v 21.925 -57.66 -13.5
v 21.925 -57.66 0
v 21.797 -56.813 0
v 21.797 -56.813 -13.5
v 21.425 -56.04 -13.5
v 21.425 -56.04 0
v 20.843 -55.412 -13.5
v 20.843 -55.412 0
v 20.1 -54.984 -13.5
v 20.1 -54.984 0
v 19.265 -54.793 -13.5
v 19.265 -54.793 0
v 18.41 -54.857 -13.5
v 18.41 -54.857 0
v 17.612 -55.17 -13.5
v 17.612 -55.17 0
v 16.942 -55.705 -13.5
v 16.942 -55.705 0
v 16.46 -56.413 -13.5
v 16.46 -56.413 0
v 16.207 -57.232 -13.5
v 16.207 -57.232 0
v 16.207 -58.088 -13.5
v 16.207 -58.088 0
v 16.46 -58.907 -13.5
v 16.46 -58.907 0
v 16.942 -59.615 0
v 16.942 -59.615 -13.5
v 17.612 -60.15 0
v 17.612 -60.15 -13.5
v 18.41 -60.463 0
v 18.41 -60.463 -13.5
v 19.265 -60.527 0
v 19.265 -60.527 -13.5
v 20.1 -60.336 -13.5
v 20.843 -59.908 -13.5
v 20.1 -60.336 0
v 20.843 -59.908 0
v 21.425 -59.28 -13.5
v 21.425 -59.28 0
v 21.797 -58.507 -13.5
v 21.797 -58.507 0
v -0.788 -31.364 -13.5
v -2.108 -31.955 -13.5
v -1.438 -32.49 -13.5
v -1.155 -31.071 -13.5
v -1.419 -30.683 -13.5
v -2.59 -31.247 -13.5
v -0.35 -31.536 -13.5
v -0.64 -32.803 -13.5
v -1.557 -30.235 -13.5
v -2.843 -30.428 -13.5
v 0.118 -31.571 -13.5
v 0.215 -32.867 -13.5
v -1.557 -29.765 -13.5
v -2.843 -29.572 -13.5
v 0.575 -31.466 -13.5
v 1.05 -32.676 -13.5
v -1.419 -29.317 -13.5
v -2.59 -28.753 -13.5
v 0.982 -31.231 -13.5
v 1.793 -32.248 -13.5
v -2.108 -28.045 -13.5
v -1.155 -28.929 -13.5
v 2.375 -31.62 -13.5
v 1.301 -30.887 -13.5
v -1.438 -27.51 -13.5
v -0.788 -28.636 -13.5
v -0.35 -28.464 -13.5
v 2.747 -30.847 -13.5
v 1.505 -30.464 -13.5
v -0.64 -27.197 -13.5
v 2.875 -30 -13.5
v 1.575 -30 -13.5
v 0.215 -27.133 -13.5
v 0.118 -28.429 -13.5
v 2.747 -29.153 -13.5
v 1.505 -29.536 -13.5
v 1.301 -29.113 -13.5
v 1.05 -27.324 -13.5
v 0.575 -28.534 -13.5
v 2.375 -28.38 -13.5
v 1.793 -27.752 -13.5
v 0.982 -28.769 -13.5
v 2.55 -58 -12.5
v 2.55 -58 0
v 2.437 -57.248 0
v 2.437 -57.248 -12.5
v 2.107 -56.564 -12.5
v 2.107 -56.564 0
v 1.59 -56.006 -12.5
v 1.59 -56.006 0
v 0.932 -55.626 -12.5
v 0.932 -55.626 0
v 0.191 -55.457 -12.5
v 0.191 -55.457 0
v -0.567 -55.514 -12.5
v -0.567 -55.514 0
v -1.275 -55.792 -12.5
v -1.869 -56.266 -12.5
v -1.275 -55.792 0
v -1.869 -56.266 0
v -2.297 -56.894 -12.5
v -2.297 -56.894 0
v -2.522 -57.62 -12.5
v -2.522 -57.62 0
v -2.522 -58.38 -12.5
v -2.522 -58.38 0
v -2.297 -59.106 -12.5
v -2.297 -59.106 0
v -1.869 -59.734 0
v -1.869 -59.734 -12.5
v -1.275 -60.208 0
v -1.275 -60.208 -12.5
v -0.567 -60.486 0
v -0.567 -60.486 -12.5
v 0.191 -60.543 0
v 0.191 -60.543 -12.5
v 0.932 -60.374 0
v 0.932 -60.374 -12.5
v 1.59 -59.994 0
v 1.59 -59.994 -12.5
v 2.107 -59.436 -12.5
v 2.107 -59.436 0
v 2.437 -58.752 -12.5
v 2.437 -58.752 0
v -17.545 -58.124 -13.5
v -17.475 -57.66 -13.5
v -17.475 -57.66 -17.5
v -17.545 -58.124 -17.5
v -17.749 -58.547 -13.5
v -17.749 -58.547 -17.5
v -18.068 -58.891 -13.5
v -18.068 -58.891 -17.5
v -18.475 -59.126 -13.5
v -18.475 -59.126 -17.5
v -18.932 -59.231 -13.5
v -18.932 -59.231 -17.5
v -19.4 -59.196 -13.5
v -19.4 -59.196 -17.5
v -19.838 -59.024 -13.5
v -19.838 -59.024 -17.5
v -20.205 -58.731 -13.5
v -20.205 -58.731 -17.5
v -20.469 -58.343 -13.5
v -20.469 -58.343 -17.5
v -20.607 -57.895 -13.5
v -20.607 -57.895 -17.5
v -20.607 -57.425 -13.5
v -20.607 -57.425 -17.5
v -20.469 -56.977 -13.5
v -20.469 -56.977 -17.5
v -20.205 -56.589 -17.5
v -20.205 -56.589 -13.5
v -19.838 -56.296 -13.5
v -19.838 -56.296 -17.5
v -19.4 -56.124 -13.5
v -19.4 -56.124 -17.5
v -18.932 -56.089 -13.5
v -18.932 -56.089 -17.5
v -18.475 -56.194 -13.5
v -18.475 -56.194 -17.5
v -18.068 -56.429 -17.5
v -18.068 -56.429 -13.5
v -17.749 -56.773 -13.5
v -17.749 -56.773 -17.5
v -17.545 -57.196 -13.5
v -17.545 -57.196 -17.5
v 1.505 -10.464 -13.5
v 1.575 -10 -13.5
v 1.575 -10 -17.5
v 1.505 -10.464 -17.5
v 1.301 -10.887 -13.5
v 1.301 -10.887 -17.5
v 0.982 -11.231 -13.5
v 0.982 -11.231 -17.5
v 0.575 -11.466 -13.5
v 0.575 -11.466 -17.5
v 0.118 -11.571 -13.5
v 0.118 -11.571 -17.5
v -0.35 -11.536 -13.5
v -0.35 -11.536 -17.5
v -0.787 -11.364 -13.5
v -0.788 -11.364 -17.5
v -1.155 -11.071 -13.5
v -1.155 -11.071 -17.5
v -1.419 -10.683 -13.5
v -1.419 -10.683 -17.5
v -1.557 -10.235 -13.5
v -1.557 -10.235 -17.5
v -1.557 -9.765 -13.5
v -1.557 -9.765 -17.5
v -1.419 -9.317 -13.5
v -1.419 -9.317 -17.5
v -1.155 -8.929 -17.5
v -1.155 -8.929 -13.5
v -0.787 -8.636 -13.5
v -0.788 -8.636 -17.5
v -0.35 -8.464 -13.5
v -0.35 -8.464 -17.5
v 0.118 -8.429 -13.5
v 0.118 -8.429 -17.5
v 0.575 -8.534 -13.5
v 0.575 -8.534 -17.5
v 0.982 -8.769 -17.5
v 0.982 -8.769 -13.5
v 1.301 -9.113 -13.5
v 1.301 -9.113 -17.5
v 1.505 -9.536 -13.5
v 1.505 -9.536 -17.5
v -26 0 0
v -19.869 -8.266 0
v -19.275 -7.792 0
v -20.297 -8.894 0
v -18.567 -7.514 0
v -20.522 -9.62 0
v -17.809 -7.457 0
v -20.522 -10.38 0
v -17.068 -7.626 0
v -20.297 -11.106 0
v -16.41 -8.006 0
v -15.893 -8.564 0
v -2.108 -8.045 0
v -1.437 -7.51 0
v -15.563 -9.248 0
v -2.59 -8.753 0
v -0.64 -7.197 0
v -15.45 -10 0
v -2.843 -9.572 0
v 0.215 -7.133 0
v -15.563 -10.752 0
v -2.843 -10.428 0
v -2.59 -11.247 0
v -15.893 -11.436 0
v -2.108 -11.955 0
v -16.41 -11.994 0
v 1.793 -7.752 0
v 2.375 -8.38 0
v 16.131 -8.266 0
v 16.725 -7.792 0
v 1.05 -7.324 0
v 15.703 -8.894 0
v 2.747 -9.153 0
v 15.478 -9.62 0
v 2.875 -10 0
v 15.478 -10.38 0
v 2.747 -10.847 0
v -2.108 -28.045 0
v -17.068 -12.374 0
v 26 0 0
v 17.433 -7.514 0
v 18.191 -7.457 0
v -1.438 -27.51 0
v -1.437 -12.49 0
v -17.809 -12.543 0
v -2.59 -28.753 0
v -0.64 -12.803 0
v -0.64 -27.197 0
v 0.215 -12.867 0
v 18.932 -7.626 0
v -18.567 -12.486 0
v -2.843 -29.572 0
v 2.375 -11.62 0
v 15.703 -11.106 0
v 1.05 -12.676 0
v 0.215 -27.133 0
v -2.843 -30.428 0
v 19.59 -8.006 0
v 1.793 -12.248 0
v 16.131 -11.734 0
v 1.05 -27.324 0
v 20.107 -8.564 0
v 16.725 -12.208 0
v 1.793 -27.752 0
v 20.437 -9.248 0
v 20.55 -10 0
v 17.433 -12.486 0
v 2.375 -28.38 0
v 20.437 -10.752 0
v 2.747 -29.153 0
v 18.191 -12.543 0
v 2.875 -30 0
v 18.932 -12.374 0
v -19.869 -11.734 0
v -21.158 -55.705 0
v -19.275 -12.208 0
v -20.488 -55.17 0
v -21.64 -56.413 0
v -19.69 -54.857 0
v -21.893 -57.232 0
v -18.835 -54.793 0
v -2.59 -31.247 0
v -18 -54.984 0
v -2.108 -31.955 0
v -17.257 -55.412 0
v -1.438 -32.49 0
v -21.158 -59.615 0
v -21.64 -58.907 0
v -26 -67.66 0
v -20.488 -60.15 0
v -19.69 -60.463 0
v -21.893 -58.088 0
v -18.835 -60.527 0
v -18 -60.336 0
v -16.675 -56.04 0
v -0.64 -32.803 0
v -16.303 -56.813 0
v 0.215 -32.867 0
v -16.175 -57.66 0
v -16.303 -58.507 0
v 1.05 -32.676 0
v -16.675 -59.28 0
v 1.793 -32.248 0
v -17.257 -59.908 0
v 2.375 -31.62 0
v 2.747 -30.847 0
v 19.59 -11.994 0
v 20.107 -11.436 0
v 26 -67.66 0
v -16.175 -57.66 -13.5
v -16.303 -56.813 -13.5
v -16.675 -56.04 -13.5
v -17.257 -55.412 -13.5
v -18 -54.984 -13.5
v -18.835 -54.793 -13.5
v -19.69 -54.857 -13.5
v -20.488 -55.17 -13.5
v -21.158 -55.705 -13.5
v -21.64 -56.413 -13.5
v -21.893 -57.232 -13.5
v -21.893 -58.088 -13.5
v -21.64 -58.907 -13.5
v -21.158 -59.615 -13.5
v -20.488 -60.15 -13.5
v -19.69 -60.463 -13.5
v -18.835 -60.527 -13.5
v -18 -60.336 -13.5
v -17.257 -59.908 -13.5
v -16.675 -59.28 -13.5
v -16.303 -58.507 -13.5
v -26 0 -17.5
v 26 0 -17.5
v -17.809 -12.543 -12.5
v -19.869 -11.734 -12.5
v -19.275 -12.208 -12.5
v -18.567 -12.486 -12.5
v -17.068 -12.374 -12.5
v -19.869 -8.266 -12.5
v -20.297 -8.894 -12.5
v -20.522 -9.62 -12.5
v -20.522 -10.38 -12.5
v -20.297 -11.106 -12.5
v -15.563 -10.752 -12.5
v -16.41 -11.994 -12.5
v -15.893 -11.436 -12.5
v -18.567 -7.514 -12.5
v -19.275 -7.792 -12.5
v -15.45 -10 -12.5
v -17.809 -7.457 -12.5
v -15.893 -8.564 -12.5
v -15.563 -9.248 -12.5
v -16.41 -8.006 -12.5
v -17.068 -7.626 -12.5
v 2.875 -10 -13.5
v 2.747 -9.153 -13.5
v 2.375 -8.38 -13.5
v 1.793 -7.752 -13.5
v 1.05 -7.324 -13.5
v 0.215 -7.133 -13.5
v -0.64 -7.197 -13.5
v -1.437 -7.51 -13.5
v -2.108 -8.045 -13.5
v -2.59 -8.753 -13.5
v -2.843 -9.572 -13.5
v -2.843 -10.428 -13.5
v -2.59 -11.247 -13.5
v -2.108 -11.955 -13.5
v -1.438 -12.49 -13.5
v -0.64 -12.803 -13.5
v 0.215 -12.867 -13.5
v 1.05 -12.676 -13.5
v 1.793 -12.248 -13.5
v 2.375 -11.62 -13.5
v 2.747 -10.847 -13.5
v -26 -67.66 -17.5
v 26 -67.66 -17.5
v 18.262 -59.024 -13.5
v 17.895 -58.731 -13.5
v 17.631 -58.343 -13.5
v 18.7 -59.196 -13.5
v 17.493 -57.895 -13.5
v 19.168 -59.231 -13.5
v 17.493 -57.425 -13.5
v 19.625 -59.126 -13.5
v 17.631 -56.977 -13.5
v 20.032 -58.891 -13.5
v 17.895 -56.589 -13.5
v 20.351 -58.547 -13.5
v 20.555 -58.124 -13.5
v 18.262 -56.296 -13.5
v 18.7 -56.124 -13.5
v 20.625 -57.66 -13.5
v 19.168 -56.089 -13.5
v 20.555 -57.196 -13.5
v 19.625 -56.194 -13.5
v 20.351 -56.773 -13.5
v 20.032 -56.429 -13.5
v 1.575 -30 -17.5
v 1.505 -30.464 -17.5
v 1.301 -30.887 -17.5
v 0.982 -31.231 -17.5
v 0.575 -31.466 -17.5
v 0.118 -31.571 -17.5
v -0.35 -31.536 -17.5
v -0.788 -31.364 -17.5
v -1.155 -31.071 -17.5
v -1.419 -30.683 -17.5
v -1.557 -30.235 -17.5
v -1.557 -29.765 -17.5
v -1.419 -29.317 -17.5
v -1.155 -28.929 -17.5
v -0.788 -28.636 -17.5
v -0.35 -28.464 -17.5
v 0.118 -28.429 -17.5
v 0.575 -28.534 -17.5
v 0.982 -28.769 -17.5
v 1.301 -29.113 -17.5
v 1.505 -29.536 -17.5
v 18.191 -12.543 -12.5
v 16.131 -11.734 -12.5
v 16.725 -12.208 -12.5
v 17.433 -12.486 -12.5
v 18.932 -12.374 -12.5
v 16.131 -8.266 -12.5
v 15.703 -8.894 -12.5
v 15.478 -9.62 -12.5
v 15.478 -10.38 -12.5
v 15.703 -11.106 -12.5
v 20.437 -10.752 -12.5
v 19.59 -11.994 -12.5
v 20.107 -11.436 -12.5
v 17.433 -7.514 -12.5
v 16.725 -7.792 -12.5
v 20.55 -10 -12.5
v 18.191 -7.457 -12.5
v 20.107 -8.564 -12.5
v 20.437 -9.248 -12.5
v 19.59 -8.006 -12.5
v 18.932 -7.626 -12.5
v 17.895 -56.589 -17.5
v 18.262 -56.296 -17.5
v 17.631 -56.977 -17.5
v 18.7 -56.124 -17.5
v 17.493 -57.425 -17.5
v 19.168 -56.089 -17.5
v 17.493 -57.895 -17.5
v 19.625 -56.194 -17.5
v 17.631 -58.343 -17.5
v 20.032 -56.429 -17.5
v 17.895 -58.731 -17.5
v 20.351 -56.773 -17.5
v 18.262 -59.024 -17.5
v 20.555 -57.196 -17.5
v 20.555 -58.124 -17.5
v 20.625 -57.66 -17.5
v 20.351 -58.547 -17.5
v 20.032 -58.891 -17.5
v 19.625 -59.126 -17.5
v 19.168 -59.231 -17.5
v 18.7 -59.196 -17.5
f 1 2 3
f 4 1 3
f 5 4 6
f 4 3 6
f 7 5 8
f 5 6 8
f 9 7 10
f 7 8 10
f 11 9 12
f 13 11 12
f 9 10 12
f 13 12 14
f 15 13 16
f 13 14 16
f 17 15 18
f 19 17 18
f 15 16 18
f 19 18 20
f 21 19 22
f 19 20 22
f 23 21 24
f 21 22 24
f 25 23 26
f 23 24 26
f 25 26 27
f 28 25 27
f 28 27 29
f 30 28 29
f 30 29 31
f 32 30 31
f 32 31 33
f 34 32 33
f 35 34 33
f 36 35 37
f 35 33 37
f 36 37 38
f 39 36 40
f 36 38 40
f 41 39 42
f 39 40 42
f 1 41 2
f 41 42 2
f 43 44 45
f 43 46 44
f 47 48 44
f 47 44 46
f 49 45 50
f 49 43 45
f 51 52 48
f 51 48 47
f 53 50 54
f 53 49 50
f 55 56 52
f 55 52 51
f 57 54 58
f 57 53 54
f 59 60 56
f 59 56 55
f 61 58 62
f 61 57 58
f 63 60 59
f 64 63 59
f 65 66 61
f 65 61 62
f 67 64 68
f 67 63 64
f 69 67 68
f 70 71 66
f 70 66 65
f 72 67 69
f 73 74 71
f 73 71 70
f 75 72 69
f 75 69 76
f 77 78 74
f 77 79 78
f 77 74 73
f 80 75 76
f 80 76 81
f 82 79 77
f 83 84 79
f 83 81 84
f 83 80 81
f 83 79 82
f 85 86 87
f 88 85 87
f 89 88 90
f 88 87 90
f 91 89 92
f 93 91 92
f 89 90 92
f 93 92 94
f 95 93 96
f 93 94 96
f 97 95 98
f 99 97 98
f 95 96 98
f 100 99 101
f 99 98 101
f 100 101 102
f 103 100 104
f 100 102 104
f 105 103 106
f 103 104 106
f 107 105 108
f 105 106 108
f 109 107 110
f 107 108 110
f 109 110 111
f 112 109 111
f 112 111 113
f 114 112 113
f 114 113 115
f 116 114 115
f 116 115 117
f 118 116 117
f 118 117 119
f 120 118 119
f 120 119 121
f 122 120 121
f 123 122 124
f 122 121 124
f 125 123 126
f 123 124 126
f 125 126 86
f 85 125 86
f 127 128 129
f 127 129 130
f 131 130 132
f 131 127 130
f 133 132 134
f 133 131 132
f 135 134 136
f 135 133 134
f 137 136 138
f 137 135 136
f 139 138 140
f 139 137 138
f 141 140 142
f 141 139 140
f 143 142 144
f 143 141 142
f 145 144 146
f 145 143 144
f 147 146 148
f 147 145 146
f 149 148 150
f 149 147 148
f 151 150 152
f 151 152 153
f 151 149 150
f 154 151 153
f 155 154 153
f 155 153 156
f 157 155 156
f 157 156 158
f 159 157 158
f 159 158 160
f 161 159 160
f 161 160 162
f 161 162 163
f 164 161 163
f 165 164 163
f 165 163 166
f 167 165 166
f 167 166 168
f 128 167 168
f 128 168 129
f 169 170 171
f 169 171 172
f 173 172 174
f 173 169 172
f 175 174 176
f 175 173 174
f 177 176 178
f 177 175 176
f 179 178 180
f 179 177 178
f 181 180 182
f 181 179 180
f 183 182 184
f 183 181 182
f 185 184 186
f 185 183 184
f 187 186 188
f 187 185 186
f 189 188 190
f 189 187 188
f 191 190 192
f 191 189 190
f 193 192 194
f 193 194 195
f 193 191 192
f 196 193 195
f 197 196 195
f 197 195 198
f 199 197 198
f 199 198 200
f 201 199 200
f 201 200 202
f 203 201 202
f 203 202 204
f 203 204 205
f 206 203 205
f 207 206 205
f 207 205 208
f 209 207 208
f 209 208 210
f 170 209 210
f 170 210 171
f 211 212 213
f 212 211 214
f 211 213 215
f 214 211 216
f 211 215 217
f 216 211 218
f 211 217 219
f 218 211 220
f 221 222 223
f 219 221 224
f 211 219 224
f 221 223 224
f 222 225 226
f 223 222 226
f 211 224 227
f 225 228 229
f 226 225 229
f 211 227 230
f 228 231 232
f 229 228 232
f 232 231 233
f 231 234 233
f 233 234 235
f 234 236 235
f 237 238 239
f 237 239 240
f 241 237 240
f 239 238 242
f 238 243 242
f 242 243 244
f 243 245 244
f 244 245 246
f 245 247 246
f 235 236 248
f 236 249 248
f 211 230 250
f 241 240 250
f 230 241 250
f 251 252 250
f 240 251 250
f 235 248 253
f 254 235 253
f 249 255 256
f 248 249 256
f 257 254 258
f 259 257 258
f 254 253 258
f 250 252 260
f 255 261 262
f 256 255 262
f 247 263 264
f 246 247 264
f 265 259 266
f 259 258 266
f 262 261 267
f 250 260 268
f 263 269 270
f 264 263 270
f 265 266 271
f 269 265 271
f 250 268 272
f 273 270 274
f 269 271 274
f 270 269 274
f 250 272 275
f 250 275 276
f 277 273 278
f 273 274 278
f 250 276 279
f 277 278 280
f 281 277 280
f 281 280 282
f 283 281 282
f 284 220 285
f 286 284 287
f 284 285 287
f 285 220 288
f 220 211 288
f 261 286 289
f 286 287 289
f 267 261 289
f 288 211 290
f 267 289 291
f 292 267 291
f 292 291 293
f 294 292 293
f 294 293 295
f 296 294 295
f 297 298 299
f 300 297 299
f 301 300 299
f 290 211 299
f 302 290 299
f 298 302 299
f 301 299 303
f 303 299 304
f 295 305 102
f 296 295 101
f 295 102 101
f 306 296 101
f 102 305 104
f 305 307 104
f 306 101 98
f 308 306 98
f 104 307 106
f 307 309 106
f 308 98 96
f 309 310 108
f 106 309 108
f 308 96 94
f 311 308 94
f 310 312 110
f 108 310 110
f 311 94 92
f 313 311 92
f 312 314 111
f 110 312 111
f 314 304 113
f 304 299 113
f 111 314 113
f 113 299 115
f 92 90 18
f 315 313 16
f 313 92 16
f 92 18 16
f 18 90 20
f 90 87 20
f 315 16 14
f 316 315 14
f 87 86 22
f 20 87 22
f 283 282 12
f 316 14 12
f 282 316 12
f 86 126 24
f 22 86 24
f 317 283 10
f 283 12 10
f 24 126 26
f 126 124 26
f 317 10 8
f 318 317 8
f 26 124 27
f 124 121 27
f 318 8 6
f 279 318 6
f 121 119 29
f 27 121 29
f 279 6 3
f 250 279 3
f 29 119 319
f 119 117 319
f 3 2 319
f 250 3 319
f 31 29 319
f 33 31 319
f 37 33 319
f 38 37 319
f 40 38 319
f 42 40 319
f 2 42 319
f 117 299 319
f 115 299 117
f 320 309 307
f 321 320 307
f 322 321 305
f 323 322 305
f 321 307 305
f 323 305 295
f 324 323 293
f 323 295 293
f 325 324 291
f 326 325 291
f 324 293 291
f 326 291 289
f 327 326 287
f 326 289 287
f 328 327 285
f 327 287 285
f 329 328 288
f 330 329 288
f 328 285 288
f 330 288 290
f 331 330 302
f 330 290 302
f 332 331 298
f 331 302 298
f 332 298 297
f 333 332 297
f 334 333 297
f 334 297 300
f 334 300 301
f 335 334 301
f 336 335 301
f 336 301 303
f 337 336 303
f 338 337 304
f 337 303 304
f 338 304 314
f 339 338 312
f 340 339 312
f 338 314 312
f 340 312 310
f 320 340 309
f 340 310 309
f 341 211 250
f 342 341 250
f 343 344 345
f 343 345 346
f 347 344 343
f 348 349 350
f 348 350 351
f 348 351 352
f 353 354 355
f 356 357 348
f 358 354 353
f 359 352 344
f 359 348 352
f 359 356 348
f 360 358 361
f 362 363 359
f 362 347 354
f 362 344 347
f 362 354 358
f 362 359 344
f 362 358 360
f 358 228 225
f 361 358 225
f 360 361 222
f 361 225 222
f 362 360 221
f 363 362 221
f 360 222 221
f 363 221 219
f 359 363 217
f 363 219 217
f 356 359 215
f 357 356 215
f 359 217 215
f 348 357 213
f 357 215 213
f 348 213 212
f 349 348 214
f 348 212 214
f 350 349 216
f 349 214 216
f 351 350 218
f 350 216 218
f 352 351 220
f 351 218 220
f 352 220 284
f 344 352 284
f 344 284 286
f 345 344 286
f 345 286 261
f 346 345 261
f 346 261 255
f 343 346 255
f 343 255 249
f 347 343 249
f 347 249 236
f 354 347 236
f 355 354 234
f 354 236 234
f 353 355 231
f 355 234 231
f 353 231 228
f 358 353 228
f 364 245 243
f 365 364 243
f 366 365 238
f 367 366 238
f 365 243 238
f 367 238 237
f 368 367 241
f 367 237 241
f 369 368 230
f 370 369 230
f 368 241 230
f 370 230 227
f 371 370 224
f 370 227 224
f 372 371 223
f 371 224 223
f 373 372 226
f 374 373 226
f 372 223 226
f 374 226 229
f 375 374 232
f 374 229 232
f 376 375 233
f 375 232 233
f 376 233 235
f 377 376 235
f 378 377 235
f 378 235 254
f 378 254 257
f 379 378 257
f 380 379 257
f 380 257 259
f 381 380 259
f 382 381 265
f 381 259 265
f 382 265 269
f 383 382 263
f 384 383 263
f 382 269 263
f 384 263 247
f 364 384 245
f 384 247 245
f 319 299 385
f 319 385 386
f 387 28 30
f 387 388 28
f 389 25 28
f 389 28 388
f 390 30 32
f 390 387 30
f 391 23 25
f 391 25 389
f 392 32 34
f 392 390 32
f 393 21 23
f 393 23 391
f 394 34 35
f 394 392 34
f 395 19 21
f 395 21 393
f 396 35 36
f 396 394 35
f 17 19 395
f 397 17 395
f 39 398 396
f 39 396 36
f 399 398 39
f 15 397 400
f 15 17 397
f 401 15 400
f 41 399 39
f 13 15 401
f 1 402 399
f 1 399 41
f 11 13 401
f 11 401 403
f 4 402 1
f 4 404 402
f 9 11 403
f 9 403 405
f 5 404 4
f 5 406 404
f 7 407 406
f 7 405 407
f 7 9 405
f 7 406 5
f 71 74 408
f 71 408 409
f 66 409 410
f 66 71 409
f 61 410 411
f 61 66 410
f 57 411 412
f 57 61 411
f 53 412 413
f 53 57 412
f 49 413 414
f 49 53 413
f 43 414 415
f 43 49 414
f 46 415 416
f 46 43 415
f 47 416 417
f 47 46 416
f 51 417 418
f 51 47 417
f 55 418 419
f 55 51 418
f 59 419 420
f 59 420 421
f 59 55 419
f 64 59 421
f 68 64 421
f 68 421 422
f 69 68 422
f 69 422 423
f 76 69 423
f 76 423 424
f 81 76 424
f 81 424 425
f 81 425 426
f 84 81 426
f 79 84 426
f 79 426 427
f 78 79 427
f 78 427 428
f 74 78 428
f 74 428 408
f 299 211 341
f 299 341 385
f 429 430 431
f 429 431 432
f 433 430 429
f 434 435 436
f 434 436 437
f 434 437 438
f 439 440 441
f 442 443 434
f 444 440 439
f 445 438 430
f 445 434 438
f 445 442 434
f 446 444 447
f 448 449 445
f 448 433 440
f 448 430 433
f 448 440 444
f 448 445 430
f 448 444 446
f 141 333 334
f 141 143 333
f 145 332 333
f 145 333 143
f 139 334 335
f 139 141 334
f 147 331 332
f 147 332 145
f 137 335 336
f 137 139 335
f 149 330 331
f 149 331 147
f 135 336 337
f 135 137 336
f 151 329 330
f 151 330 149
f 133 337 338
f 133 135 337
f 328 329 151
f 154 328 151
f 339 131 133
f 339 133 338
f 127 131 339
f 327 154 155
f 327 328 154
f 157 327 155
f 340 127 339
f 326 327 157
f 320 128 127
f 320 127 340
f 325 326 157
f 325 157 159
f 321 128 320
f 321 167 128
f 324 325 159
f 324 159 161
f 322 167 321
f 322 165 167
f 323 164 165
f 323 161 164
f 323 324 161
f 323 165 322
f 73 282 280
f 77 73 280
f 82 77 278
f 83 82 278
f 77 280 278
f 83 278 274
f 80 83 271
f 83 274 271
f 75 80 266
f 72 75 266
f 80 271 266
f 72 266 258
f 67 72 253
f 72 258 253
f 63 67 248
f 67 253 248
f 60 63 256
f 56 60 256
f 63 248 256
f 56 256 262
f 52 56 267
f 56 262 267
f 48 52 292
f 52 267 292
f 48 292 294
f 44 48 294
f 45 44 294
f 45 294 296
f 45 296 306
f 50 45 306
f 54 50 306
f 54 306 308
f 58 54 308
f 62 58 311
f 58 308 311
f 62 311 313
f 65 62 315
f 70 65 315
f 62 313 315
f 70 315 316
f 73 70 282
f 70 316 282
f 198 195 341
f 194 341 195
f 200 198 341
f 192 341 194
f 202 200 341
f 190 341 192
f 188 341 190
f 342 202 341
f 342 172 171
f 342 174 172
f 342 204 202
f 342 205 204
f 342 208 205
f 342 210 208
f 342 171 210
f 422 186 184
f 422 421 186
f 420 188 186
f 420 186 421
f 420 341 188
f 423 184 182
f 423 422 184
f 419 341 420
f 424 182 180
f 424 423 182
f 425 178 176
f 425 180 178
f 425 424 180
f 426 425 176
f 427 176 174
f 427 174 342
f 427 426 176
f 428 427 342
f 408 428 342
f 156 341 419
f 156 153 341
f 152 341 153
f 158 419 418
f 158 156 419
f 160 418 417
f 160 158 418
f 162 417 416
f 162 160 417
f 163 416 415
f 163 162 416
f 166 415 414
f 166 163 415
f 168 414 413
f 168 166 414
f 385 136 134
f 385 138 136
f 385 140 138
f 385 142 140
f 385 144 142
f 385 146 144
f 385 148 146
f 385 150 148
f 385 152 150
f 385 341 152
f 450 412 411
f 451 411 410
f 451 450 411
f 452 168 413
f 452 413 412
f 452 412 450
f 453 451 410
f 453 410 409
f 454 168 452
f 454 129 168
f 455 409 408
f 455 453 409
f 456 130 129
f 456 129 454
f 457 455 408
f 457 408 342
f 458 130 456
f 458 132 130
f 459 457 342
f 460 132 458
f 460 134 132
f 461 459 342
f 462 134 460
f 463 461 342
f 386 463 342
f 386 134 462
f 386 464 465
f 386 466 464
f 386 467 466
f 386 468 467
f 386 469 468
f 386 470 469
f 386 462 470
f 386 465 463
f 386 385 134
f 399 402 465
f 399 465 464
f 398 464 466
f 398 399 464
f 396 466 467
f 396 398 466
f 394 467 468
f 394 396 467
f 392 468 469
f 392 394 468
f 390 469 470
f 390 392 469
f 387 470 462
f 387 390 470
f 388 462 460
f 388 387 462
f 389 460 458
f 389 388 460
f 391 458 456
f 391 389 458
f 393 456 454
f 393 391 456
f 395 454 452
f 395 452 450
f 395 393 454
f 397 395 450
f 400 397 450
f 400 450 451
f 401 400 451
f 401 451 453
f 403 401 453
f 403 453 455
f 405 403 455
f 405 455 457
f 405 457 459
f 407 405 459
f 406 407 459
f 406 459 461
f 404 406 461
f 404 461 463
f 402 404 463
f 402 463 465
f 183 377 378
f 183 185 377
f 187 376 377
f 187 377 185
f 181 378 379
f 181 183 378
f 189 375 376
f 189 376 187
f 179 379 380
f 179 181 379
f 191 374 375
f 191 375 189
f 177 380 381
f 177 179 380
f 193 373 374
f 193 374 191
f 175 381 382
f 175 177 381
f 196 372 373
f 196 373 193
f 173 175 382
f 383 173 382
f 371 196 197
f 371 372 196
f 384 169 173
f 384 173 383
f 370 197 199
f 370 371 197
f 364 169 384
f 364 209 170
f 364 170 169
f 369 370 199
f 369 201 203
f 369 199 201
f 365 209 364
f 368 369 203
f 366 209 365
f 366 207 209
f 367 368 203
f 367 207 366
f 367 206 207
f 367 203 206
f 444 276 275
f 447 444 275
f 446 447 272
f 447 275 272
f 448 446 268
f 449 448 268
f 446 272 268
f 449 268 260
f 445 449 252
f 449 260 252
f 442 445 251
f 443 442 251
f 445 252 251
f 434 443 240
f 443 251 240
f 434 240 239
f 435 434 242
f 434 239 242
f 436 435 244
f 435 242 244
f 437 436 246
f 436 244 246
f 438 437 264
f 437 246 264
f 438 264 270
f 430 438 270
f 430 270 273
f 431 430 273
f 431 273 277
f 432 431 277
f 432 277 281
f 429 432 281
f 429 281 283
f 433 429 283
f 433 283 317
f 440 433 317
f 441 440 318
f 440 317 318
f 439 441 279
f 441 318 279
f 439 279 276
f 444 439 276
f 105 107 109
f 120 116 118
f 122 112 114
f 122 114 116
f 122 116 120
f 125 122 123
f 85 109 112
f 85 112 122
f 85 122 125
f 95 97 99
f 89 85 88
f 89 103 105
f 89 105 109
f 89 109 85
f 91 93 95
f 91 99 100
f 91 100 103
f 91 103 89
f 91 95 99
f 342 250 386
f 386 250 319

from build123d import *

# Parameters (mm, degrees)
F1_W     = 52
F1_H     = 67.66
F2_DEPTH = 17.5
F0_R     = 1.575
F3_DEPTH = 17.5
F4_R     = 2.875
F5_DEPTH = 13.5
F6_R     = 2.55
F7_DEPTH = 12.5
F8_ANGLE = 180
F9_ANGLE = 180


with BuildPart() as f2:
    # F1 (on Top) → F2 (new body)
    with BuildSketch(Plane.XY):
        with Locations((0, 3.83)):
            Rectangle(F1_W, F1_H)
    extrude(amount=F2_DEPTH)

    # F0 (on Top) → F3 (cut)
    with BuildSketch(Plane.XY):
        Circle(F0_R)
        with Locations((0, -20)):
            Circle(F0_R)
        with Locations((-19.05, 27.66)):
            Circle(F0_R)
        with Locations((19.05, 27.66)):
            Circle(F0_R)
    extrude(amount=F3_DEPTH, mode=Mode.SUBTRACT)

    # F4 (on face) → F5 (cut)
    with BuildSketch(Plane(origin=(0, 0, 0), x_dir=(1, 0, 0), z_dir=(0, 0, -1))):
        Circle(F4_R)
        with Locations((19.05, -27.66)):
            Circle(F4_R)
        with Locations((-19.05, -27.66)):
            Circle(F4_R)
        with Locations((0, 20)):
            Circle(F4_R)
    extrude(amount=-F5_DEPTH, mode=Mode.SUBTRACT)

    # F6 (on face) → F7 (cut)
    with BuildSketch(Plane(origin=(0, 0, 0), x_dir=(1, 0, 0), z_dir=(0, 0, -1))):
        with Locations((0, -28)):
            Circle(F6_R)
        with Locations((-18, 20)):
            Circle(F6_R)
        with Locations((18, 20)):
            Circle(F6_R)
    extrude(amount=-F7_DEPTH, mode=Mode.SUBTRACT)


with BuildPart() as f2_1:
    # F8: moved
    add(f2.part.rotate(Axis((-26, 3.83, 17.5), (0, 1, 0)), F8_ANGLE))


with BuildPart() as f2_2:
    # F9: moved
    add(f2_1.part.rotate(Axis((-26, 37.66, 26.25), (0, 0, 1)), F9_ANGLE))


with BuildPart() as f2_3:
    # F11: moved
    add(f2_2.part.moved(Location((0, -105.32, -35))))


solid = f2_3.part
